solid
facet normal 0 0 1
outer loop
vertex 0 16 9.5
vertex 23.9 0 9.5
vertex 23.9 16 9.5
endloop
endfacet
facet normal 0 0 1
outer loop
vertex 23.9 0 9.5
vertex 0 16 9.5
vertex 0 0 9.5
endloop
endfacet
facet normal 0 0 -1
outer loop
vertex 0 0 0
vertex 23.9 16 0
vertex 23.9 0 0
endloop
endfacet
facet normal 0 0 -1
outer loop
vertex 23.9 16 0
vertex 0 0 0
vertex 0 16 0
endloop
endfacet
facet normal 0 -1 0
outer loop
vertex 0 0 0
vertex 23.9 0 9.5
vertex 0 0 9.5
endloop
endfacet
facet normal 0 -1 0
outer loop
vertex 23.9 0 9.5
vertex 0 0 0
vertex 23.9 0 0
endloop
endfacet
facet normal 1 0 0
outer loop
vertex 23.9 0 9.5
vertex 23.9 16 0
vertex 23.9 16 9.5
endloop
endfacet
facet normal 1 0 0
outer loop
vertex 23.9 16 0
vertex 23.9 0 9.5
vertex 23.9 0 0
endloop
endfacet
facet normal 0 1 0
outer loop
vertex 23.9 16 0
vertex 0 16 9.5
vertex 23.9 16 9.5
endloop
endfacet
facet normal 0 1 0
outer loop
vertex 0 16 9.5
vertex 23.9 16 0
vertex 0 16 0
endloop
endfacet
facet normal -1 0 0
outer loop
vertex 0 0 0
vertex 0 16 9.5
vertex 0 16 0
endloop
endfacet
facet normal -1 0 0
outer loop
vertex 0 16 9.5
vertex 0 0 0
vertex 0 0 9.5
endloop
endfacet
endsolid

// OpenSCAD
LEGObrick();

module LEGObrick(studs_per_row=3) {
    cube([23.9, 16, 9.5]);
}
